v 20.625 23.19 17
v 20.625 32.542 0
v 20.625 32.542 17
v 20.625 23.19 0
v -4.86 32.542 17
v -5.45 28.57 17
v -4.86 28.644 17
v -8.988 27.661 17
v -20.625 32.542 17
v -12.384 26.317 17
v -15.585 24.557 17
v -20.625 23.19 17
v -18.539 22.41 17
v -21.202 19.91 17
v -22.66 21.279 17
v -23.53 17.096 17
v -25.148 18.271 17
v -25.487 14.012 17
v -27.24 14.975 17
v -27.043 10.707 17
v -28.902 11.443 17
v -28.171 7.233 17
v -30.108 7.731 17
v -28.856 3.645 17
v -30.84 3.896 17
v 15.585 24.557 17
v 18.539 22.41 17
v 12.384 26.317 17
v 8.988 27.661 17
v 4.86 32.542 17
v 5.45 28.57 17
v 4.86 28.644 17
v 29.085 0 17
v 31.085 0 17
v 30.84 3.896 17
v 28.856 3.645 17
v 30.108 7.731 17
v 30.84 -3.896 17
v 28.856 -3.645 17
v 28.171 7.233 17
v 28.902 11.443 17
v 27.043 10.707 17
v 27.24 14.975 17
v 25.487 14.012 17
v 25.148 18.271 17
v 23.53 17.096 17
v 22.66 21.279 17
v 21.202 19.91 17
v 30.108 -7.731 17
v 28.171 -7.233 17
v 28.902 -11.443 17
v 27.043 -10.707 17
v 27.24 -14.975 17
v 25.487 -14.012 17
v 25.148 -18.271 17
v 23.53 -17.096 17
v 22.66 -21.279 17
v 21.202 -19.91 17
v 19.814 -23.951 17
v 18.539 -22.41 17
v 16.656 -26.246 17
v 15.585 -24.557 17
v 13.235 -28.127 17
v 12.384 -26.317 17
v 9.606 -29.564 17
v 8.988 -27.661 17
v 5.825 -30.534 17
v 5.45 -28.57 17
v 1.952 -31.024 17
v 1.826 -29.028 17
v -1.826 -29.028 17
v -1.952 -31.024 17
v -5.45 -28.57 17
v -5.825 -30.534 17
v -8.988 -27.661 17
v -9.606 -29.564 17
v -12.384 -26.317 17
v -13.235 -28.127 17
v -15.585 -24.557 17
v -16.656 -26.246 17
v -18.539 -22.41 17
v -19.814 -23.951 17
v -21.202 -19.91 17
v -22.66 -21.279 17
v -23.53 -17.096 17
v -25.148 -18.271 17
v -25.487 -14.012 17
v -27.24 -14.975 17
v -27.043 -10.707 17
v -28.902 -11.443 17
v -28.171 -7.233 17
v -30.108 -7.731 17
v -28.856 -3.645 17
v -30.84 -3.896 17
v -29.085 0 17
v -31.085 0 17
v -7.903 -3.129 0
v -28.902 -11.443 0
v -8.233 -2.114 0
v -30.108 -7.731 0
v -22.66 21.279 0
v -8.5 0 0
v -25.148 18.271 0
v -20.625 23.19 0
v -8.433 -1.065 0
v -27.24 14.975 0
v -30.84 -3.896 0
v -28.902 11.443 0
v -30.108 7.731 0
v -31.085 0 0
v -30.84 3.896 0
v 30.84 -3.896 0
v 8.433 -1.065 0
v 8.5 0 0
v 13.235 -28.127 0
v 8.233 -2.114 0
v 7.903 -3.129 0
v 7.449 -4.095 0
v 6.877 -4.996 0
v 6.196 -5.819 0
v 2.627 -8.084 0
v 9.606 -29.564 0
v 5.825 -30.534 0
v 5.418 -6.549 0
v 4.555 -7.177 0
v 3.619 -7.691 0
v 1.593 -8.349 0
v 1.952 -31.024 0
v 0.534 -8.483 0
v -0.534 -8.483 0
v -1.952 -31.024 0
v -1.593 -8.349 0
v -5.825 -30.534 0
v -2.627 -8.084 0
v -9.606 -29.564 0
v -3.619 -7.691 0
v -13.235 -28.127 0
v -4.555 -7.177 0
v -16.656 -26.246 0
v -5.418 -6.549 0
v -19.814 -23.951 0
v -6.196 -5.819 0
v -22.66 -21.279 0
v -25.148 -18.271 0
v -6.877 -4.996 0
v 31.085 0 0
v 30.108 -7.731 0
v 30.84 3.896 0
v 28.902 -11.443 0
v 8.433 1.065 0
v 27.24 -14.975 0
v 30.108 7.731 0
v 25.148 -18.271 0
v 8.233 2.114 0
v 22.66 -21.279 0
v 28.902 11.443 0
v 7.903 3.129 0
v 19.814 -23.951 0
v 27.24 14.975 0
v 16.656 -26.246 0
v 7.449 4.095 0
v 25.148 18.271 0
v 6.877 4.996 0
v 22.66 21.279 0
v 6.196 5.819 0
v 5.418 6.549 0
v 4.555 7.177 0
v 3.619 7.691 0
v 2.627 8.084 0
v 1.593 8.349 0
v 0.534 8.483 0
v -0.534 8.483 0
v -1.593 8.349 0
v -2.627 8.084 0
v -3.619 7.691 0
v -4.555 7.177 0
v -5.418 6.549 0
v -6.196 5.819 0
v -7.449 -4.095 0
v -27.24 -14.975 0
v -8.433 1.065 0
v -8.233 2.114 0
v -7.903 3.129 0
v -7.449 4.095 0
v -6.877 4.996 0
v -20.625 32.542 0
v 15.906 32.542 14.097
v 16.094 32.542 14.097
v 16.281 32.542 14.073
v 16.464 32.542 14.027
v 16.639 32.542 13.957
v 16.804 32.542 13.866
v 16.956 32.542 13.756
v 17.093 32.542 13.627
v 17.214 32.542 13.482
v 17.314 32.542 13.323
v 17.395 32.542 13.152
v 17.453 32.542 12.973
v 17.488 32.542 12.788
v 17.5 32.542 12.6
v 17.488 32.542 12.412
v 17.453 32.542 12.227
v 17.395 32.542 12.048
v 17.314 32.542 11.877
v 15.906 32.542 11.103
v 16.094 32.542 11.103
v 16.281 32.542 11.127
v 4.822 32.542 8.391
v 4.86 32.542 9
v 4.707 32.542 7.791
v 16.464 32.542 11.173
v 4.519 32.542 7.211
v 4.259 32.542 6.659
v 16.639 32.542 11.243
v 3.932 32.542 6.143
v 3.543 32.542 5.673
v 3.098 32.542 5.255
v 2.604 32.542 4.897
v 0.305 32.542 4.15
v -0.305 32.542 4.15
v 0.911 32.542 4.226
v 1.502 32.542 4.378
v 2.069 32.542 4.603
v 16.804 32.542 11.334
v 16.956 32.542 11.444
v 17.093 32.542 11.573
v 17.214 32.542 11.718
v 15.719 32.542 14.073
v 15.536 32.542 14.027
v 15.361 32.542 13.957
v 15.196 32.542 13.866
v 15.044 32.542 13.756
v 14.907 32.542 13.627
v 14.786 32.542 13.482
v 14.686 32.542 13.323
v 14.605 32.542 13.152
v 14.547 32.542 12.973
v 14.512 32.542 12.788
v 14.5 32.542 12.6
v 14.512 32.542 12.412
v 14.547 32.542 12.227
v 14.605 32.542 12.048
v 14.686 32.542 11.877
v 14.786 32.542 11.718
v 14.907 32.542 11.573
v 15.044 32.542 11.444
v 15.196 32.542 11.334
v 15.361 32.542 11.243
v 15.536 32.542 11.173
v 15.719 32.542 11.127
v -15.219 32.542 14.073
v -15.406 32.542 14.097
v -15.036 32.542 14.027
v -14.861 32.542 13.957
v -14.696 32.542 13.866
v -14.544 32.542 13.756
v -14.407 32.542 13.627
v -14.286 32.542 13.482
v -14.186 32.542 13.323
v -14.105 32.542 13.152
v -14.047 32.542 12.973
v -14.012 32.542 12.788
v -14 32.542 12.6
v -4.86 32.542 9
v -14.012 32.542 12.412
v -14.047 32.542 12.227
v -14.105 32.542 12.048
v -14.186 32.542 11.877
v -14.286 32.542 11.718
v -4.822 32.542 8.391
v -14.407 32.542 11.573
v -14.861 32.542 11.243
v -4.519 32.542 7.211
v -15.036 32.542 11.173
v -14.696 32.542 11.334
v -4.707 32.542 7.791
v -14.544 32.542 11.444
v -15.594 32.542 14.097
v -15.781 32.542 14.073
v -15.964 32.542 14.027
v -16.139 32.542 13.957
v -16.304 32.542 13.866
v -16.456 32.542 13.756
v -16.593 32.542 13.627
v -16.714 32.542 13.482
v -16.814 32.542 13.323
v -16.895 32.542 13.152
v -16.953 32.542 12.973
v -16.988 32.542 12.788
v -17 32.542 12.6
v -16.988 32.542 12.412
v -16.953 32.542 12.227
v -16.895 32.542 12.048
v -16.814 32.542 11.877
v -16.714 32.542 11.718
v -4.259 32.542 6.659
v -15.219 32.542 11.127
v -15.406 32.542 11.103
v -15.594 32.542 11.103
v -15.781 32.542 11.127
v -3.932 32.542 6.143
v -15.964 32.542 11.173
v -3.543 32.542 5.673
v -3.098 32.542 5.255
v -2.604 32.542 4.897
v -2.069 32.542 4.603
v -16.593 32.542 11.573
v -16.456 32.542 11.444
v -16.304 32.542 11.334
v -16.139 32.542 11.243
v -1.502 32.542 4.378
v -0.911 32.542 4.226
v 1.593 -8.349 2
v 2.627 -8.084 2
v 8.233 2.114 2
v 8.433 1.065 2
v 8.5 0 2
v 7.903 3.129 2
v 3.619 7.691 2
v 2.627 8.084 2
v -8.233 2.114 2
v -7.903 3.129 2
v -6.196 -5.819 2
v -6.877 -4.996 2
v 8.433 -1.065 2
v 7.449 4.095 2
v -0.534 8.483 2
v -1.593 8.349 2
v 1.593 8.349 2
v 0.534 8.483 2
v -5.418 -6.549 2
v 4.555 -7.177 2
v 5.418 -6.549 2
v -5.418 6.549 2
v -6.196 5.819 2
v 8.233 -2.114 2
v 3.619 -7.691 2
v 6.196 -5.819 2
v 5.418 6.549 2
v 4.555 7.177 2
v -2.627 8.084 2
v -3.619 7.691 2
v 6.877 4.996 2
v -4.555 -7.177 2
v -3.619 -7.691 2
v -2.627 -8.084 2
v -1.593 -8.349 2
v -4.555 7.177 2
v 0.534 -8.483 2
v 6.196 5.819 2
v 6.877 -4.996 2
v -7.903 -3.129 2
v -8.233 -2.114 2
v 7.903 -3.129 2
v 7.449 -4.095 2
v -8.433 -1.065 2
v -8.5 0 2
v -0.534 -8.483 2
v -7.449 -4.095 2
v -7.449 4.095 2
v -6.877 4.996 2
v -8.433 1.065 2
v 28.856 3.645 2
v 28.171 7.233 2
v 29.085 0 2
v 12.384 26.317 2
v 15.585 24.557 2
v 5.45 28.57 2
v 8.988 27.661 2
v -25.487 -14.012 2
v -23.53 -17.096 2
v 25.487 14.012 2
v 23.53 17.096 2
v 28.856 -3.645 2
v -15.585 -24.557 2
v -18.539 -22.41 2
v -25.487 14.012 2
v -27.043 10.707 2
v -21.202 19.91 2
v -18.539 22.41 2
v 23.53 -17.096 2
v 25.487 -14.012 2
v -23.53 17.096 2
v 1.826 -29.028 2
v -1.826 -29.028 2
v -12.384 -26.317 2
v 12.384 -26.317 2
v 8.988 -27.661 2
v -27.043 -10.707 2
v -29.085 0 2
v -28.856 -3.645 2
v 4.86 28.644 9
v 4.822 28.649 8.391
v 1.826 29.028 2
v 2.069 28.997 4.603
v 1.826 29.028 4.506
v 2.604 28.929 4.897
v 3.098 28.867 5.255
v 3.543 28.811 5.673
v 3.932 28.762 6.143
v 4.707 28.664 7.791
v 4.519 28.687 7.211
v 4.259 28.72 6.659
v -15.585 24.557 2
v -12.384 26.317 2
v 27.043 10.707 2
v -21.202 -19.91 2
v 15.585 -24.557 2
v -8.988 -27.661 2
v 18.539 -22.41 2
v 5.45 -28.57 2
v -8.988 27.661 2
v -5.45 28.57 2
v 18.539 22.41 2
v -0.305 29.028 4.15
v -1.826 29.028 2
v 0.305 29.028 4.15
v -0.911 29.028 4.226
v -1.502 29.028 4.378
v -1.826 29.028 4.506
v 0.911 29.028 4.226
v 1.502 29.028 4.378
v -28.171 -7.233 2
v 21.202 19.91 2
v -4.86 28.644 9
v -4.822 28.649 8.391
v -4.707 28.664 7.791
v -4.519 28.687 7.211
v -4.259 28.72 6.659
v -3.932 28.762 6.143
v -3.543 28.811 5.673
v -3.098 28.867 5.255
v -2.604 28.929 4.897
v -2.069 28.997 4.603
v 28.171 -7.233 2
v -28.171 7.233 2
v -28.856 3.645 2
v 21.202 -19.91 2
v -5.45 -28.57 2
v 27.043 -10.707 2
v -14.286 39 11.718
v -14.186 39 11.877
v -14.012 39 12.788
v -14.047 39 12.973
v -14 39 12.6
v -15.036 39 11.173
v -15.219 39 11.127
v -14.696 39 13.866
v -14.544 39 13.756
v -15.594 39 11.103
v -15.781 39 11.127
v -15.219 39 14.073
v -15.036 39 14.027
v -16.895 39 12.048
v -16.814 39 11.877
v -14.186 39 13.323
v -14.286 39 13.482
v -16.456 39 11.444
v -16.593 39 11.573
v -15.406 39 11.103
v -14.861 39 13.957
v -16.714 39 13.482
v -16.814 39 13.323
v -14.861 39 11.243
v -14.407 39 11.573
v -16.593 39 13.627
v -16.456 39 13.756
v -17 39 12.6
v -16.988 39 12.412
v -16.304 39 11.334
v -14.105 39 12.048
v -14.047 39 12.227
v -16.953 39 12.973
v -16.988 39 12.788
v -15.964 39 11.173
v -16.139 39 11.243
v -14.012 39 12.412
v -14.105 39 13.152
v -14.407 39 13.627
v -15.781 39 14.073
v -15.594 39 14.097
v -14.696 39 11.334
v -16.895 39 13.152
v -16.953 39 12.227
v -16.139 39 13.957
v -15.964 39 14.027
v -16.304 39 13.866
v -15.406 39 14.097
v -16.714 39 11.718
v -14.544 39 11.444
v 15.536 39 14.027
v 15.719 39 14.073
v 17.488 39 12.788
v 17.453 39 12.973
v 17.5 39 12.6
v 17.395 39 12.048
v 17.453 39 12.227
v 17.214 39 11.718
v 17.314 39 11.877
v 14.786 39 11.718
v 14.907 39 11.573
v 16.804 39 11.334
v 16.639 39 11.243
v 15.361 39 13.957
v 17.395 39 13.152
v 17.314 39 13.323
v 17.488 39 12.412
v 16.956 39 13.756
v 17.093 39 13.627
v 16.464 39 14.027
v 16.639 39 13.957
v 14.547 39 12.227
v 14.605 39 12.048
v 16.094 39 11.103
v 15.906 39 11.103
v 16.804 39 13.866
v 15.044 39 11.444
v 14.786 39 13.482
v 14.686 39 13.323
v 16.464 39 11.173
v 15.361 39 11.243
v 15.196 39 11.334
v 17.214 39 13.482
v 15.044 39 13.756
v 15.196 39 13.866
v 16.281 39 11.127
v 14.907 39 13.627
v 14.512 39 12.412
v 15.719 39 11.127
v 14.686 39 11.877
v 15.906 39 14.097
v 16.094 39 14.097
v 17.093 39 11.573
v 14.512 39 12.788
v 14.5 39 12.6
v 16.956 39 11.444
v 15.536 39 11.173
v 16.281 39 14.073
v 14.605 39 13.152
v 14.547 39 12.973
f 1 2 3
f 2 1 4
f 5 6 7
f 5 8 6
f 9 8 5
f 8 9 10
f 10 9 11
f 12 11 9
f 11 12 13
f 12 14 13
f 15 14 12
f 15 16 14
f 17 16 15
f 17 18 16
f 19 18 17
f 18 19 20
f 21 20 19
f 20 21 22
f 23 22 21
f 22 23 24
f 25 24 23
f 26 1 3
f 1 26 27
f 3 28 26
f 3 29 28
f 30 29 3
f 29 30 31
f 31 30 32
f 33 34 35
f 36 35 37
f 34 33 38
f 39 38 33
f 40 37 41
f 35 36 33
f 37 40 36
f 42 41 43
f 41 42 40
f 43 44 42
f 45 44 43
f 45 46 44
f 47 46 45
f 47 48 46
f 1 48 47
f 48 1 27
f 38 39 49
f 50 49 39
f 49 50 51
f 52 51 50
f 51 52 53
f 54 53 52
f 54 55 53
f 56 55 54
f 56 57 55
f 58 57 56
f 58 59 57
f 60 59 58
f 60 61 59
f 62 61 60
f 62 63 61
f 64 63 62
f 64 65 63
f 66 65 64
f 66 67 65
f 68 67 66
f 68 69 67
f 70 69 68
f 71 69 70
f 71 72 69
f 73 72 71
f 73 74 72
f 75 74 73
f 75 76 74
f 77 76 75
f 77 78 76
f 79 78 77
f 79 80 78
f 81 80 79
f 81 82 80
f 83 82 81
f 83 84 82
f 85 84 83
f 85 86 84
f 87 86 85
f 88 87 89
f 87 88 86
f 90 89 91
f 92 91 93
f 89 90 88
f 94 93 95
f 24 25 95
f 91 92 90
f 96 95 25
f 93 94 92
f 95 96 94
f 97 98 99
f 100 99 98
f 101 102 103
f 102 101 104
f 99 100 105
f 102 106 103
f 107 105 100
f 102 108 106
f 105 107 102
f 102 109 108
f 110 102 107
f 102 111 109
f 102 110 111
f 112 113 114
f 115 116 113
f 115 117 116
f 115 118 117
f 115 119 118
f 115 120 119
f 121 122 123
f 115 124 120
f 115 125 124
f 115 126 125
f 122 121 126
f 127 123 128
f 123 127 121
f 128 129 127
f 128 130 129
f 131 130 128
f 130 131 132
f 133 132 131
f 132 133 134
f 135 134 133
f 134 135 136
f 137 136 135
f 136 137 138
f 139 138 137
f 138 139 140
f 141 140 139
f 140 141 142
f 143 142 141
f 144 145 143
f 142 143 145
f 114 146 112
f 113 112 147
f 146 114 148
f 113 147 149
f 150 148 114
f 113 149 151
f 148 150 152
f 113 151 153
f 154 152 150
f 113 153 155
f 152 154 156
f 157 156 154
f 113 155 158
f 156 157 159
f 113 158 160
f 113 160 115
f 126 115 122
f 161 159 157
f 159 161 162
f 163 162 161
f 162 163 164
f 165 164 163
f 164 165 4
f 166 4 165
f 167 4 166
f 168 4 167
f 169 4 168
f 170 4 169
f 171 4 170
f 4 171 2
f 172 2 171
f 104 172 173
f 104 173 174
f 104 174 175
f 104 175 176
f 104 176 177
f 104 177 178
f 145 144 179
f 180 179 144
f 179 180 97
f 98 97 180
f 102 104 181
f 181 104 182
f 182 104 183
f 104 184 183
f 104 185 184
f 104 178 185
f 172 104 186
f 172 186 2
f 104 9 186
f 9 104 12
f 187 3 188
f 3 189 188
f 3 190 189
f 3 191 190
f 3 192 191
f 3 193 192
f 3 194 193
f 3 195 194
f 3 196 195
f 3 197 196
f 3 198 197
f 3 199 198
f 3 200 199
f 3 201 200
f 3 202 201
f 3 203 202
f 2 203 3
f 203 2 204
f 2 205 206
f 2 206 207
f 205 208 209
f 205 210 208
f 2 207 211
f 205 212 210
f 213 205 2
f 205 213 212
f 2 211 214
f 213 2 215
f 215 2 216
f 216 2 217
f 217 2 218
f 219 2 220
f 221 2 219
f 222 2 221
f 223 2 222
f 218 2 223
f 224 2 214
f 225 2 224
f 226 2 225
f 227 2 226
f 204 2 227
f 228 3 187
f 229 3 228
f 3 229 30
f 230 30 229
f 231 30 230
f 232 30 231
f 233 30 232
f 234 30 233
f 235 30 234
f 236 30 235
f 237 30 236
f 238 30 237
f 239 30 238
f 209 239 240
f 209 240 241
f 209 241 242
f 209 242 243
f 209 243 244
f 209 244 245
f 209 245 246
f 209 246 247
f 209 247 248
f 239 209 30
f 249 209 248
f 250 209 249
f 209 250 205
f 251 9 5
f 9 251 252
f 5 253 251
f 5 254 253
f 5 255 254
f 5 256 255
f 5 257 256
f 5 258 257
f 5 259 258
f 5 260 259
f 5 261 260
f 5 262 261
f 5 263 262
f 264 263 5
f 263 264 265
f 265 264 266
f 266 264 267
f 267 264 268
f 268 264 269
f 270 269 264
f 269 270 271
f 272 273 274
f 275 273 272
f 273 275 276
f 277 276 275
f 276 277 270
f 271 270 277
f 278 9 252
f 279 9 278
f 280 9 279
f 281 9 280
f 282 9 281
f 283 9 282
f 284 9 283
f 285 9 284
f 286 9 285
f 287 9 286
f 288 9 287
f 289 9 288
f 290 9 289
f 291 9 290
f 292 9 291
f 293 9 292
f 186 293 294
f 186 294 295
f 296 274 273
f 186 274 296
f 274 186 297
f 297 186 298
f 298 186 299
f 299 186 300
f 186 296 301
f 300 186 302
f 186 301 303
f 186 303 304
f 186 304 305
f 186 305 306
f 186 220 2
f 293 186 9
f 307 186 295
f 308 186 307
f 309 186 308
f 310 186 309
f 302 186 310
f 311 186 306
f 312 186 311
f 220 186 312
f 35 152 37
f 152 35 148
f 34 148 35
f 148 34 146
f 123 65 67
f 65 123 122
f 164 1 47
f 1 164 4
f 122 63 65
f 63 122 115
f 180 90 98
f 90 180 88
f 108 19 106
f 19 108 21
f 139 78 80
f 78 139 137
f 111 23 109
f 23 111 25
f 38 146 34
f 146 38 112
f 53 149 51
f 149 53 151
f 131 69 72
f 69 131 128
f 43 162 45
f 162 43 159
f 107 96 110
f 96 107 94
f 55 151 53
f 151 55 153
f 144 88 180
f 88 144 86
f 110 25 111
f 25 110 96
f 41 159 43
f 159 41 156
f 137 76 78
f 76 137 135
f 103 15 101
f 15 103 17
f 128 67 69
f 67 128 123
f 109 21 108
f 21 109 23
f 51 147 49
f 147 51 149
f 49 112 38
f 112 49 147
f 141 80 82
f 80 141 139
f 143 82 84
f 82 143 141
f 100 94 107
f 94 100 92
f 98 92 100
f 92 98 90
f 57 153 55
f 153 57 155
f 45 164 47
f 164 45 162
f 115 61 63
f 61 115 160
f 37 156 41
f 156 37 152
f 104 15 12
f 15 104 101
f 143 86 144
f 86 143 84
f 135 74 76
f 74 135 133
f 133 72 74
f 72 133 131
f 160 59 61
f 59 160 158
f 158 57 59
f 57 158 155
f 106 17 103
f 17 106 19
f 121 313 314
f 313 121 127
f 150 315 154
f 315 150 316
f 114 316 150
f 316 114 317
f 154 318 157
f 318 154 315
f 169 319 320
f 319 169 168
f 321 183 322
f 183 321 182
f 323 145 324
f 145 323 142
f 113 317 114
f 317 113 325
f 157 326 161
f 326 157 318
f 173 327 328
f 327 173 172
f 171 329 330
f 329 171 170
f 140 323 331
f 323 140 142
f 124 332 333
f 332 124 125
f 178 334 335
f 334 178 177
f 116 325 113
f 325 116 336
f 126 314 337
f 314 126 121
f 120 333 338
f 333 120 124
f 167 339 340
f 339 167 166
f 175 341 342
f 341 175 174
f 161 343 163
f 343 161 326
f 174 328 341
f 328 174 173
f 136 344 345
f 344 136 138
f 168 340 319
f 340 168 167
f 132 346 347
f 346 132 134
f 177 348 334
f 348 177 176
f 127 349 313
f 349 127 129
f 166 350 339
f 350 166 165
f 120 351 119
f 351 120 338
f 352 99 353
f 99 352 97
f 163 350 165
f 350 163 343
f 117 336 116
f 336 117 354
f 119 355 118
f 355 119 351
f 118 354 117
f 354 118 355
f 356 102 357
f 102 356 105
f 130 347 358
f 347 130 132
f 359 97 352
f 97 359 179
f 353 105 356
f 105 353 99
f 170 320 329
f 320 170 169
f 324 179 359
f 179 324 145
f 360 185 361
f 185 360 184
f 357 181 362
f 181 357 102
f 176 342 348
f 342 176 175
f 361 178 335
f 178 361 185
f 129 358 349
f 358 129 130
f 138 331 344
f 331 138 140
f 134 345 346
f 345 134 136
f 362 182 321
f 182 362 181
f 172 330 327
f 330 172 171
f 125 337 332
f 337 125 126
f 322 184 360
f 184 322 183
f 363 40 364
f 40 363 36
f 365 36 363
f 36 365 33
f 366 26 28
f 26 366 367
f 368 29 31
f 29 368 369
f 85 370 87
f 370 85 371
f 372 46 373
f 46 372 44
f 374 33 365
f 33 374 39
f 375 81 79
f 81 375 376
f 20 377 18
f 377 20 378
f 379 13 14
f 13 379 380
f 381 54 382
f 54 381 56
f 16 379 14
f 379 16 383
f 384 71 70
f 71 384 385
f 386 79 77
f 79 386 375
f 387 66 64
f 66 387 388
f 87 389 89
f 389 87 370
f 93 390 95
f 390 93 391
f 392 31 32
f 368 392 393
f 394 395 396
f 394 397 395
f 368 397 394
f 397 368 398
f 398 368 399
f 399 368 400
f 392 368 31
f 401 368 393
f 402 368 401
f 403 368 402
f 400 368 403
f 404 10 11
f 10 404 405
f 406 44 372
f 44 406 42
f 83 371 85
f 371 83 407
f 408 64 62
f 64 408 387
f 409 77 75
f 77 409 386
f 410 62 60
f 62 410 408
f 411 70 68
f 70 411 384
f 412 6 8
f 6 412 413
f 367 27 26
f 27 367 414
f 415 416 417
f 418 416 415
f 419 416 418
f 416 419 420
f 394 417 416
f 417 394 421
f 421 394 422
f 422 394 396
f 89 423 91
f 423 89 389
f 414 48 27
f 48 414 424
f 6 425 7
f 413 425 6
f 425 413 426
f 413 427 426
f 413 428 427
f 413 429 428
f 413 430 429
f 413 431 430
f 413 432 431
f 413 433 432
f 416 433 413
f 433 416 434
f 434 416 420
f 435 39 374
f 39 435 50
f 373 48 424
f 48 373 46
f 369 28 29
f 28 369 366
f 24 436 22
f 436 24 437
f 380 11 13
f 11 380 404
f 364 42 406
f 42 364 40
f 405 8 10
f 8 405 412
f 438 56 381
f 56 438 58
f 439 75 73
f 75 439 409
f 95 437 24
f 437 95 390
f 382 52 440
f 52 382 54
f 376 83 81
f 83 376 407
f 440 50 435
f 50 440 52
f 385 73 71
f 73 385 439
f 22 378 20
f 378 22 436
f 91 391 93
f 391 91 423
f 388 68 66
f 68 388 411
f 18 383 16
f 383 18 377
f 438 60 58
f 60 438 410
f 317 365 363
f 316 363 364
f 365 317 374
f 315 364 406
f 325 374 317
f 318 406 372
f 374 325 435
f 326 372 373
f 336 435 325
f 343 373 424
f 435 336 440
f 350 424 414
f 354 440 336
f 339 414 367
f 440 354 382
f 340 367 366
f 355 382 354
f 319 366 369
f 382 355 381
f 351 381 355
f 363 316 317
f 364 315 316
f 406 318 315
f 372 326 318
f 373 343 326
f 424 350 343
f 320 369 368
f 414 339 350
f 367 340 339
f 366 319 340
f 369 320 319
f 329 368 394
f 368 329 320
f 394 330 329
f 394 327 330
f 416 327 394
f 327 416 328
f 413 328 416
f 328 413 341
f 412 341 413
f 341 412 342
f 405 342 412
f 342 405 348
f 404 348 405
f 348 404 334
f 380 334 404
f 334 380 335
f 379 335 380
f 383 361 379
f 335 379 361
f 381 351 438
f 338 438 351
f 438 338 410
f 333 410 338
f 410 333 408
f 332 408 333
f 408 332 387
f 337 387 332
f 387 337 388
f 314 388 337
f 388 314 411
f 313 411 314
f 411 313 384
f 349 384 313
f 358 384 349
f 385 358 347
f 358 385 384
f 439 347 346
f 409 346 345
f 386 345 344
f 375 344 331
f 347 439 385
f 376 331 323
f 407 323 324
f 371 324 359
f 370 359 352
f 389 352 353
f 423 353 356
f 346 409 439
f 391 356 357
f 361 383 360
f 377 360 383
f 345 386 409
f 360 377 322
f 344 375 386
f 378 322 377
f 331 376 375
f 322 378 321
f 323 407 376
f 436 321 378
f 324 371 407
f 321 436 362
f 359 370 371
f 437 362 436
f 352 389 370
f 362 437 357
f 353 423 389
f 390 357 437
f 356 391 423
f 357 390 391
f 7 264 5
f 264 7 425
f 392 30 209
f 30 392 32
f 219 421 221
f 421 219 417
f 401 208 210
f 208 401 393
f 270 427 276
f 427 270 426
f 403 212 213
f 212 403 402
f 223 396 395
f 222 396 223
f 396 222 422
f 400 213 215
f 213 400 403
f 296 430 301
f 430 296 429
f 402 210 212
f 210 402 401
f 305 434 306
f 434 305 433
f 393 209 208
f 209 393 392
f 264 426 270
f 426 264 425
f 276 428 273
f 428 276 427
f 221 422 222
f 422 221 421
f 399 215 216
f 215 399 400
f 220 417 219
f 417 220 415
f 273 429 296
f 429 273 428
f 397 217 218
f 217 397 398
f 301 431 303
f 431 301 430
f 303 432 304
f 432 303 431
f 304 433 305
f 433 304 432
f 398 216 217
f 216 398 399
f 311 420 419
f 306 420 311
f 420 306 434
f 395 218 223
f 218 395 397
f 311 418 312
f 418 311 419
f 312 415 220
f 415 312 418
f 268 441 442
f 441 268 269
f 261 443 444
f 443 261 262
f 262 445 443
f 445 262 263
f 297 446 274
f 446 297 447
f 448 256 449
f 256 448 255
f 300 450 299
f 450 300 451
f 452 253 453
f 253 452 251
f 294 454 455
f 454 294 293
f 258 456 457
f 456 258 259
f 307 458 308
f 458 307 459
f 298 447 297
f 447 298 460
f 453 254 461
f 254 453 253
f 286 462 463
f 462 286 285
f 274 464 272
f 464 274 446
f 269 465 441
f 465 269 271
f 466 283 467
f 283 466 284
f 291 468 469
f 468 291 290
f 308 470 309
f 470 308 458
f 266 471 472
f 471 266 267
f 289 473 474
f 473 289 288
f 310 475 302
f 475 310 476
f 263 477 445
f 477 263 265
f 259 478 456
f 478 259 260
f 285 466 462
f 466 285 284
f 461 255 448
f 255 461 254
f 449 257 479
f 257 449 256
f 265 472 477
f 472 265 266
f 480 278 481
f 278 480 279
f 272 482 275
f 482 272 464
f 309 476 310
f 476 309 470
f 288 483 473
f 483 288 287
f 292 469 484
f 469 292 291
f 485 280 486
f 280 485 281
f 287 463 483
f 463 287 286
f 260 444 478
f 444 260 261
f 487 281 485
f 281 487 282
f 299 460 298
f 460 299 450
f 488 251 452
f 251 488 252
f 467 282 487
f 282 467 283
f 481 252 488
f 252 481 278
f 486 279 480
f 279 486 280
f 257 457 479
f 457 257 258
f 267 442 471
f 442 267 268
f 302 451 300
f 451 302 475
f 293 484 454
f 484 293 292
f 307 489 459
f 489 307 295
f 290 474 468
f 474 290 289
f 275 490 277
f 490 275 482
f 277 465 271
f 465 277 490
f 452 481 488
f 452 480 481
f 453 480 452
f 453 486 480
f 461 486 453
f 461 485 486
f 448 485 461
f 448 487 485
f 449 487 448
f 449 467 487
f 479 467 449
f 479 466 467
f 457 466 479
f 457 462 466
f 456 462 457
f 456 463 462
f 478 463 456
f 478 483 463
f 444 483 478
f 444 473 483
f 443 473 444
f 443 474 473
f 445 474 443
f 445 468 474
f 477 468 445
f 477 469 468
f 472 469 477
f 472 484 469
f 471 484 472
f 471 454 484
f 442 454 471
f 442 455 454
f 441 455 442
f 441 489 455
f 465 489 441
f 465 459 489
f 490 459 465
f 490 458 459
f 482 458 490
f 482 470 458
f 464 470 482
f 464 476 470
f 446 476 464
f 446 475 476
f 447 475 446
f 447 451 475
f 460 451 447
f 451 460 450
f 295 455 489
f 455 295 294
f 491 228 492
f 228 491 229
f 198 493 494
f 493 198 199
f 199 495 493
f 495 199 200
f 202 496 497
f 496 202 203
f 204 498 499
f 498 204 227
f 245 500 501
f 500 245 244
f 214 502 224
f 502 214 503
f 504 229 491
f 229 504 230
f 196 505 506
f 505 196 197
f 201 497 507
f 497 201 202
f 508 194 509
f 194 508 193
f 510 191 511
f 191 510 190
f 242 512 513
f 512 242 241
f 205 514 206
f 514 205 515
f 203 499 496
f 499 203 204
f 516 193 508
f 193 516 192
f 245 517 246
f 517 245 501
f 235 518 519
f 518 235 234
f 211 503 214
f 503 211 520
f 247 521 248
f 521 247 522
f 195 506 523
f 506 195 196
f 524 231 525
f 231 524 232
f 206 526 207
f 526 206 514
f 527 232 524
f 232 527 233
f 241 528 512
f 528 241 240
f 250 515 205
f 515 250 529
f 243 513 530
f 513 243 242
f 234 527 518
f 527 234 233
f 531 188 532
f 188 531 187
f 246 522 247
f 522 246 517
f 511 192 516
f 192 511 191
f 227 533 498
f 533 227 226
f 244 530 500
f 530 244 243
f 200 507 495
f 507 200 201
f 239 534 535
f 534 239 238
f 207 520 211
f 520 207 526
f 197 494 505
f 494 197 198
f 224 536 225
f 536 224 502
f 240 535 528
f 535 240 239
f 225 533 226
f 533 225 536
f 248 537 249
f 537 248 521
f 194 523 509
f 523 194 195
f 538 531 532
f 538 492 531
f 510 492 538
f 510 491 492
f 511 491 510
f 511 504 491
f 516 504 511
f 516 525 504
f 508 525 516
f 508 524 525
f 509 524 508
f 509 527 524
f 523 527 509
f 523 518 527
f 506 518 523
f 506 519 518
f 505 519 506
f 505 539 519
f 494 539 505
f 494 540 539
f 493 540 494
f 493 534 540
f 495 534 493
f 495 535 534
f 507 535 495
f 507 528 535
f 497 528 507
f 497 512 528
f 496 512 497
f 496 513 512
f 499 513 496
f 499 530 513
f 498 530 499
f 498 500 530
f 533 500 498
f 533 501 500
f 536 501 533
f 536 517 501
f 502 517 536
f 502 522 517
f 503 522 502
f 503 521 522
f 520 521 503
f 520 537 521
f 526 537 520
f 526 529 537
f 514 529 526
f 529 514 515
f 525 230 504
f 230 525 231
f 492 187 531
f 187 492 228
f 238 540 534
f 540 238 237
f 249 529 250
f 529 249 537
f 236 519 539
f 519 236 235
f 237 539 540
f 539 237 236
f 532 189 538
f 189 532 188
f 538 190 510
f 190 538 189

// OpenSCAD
difference(){
    union(){
    translate ([0,15,8.5])
cube([41.25,35.085,17], center = true);
cylinder(17,31.085,31.085, center=false, $fn=50);}
cylinder(13,8.5,8.5, center=true, $fn=50);
translate ([0,0,2])
    cylinder(15,29.085,29.085, center=false, $fn=50);

translate ([-4.86,34,9])
rotate ([90,0,0])
cube([9.72,15,10], center=false);
translate([0,35,9])
rotate ([90,0,0])
    cylinder (8,4.86,4.86, $fn=50);
}

translate([-15.5,39,12.6])
rotate([90,0,0])
cylinder(13,1.5,1.5, $fn=50);
translate([16,39,12.6])
rotate([90,0,0])
cylinder(13,1.5,1.5, $fn=50);
